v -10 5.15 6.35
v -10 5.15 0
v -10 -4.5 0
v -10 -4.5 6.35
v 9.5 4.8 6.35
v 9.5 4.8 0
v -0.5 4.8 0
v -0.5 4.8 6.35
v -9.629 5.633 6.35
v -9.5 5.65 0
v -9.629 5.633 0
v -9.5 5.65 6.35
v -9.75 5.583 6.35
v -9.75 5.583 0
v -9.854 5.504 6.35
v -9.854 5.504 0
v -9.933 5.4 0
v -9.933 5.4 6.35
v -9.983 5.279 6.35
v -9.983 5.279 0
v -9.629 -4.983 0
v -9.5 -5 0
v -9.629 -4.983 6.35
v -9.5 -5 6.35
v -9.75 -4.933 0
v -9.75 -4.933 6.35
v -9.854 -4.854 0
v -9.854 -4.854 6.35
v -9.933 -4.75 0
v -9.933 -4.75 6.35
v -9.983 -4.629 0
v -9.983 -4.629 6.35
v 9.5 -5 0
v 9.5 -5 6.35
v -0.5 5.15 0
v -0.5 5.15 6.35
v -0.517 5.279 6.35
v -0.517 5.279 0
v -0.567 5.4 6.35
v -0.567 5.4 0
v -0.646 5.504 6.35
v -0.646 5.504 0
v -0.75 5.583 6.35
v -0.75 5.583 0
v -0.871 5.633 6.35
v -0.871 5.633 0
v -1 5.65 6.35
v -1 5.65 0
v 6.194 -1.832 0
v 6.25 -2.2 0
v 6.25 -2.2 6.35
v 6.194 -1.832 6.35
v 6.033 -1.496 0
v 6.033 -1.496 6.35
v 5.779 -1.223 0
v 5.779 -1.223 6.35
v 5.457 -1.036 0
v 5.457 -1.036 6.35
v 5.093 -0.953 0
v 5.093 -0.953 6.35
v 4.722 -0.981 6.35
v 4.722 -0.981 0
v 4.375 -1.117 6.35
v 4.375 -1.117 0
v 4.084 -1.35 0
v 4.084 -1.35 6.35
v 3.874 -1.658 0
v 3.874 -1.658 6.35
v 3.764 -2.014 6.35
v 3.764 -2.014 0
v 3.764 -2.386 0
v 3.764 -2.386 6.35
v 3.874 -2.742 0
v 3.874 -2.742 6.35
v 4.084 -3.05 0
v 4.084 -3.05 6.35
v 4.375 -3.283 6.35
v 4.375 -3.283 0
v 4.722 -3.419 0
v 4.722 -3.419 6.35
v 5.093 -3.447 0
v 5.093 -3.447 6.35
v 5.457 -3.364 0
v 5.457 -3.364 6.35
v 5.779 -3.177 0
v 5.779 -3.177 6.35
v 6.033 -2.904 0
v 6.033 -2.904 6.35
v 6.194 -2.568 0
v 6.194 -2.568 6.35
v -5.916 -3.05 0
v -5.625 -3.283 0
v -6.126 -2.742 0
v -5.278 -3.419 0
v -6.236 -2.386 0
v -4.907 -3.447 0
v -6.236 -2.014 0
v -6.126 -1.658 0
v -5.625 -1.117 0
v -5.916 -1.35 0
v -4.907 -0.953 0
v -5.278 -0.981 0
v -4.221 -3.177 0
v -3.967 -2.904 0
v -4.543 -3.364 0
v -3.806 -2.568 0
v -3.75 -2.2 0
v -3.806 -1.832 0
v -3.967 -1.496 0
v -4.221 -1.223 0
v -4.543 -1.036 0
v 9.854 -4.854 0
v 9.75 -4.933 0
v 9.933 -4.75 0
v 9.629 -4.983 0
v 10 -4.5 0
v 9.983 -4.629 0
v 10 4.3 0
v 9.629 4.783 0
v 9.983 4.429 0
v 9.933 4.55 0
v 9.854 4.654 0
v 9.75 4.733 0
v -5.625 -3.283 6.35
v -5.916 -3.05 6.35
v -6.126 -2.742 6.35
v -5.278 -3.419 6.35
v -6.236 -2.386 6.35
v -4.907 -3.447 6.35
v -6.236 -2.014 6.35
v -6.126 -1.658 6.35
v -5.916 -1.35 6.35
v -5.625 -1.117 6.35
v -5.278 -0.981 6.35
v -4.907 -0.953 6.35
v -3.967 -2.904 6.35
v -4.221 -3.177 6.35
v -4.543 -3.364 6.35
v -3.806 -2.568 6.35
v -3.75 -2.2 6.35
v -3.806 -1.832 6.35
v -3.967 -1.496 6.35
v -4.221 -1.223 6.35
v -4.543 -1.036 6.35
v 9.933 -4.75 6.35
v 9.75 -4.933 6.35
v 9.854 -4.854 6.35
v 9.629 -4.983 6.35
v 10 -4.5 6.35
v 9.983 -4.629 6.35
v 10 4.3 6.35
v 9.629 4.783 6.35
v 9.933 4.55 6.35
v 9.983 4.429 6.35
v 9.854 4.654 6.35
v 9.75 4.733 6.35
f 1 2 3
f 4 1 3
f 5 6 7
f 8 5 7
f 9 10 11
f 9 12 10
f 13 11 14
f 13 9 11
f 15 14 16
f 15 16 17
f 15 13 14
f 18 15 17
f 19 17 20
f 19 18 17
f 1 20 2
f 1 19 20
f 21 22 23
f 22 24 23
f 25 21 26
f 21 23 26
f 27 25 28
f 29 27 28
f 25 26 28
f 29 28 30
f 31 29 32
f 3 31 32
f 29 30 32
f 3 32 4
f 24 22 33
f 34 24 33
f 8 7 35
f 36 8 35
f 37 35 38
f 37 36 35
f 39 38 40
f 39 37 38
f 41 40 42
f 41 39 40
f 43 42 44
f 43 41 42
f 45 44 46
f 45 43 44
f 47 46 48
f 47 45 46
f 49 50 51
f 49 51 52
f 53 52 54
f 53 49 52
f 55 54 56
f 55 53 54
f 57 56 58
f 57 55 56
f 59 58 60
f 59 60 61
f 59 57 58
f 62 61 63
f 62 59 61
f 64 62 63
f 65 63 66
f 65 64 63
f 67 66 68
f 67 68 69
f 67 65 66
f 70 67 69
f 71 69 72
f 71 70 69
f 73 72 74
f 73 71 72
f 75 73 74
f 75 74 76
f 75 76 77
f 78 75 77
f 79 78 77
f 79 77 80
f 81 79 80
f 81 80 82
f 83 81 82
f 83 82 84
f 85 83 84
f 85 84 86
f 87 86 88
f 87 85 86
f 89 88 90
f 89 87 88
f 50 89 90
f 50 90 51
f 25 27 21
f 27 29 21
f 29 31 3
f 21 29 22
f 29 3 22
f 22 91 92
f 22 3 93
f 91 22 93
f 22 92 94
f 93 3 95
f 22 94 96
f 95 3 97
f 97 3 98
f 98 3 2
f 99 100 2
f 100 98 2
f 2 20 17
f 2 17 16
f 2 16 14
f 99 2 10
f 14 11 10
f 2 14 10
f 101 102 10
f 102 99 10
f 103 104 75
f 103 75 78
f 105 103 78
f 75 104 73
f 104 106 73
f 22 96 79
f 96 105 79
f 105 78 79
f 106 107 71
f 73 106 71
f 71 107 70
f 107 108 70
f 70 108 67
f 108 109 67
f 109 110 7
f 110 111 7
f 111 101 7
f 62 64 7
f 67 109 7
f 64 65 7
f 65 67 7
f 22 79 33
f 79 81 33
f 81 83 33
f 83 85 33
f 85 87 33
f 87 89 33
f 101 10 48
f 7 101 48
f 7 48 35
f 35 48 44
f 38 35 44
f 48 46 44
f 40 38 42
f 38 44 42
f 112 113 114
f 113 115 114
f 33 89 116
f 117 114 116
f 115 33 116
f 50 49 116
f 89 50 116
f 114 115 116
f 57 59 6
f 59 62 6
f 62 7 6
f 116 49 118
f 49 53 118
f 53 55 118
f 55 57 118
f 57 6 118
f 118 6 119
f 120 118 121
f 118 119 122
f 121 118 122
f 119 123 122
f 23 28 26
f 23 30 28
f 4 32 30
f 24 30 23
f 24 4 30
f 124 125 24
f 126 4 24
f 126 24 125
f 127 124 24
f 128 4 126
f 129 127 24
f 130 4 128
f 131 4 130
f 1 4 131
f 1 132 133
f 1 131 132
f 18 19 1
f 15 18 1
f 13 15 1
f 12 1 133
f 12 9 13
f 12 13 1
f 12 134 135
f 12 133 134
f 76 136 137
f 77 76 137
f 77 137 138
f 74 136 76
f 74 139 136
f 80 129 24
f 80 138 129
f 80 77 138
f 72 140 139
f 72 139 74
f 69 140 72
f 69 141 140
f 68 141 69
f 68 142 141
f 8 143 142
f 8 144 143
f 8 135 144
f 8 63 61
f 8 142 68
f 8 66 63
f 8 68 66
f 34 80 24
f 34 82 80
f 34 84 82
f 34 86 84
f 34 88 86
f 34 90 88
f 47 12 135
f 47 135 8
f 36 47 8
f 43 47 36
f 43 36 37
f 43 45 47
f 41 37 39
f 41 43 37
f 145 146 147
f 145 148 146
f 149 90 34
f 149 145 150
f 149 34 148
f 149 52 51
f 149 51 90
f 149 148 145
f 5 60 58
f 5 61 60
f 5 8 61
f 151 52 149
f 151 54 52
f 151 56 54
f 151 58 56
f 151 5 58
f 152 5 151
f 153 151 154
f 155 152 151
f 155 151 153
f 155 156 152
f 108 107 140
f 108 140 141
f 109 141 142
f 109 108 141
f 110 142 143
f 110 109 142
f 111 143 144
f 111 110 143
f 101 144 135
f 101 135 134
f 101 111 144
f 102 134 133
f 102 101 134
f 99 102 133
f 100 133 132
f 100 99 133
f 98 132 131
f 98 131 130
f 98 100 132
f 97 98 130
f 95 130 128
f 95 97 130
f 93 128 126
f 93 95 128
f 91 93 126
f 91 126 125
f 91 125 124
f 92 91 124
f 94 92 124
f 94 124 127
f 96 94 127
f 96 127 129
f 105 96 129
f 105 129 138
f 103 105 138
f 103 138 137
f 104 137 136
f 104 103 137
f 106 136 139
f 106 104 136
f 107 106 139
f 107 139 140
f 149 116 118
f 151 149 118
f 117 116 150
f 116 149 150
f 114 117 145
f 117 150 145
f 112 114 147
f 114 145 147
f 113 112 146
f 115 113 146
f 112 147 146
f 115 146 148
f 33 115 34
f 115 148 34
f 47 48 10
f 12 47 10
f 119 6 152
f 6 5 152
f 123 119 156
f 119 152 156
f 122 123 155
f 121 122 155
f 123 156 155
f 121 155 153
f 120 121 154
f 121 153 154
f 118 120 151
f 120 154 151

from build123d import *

# Parameters (mm, degrees)
SKETCH1_R           = 1.25
BOSS_EXTRUDE1_DEPTH = 6.35
FILLET1_R           = 0.5


with BuildPart() as part:
    # Sketch1 → Boss-Extrude1 (new body)
    with BuildSketch(Plane.XY):
        Polygon((10, 4.8), (-0.5, 4.8), (-0.5, 5.65), (-10, 5.65), (-10, -5), (10, -5), align=None)
        with Locations((-5, -2.2)):
            Circle(SKETCH1_R, mode=Mode.SUBTRACT)
        with Locations((5, -2.2)):
            Circle(SKETCH1_R, mode=Mode.SUBTRACT)
    extrude(amount=BOSS_EXTRUDE1_DEPTH)

    # Fillet1
    fillet1_edges = [part.edges().sort_by_distance(p)[0] for p in [
        (-10, 5.65, 3.175),
        (-0.5, 5.65, 3.175),
        (10, 4.8, 3.175),
        (10, -5, 3.175),
        (-10, -5, 3.175),
    ]]
    fillet(fillet1_edges, radius=FILLET1_R)


solid = part.part
